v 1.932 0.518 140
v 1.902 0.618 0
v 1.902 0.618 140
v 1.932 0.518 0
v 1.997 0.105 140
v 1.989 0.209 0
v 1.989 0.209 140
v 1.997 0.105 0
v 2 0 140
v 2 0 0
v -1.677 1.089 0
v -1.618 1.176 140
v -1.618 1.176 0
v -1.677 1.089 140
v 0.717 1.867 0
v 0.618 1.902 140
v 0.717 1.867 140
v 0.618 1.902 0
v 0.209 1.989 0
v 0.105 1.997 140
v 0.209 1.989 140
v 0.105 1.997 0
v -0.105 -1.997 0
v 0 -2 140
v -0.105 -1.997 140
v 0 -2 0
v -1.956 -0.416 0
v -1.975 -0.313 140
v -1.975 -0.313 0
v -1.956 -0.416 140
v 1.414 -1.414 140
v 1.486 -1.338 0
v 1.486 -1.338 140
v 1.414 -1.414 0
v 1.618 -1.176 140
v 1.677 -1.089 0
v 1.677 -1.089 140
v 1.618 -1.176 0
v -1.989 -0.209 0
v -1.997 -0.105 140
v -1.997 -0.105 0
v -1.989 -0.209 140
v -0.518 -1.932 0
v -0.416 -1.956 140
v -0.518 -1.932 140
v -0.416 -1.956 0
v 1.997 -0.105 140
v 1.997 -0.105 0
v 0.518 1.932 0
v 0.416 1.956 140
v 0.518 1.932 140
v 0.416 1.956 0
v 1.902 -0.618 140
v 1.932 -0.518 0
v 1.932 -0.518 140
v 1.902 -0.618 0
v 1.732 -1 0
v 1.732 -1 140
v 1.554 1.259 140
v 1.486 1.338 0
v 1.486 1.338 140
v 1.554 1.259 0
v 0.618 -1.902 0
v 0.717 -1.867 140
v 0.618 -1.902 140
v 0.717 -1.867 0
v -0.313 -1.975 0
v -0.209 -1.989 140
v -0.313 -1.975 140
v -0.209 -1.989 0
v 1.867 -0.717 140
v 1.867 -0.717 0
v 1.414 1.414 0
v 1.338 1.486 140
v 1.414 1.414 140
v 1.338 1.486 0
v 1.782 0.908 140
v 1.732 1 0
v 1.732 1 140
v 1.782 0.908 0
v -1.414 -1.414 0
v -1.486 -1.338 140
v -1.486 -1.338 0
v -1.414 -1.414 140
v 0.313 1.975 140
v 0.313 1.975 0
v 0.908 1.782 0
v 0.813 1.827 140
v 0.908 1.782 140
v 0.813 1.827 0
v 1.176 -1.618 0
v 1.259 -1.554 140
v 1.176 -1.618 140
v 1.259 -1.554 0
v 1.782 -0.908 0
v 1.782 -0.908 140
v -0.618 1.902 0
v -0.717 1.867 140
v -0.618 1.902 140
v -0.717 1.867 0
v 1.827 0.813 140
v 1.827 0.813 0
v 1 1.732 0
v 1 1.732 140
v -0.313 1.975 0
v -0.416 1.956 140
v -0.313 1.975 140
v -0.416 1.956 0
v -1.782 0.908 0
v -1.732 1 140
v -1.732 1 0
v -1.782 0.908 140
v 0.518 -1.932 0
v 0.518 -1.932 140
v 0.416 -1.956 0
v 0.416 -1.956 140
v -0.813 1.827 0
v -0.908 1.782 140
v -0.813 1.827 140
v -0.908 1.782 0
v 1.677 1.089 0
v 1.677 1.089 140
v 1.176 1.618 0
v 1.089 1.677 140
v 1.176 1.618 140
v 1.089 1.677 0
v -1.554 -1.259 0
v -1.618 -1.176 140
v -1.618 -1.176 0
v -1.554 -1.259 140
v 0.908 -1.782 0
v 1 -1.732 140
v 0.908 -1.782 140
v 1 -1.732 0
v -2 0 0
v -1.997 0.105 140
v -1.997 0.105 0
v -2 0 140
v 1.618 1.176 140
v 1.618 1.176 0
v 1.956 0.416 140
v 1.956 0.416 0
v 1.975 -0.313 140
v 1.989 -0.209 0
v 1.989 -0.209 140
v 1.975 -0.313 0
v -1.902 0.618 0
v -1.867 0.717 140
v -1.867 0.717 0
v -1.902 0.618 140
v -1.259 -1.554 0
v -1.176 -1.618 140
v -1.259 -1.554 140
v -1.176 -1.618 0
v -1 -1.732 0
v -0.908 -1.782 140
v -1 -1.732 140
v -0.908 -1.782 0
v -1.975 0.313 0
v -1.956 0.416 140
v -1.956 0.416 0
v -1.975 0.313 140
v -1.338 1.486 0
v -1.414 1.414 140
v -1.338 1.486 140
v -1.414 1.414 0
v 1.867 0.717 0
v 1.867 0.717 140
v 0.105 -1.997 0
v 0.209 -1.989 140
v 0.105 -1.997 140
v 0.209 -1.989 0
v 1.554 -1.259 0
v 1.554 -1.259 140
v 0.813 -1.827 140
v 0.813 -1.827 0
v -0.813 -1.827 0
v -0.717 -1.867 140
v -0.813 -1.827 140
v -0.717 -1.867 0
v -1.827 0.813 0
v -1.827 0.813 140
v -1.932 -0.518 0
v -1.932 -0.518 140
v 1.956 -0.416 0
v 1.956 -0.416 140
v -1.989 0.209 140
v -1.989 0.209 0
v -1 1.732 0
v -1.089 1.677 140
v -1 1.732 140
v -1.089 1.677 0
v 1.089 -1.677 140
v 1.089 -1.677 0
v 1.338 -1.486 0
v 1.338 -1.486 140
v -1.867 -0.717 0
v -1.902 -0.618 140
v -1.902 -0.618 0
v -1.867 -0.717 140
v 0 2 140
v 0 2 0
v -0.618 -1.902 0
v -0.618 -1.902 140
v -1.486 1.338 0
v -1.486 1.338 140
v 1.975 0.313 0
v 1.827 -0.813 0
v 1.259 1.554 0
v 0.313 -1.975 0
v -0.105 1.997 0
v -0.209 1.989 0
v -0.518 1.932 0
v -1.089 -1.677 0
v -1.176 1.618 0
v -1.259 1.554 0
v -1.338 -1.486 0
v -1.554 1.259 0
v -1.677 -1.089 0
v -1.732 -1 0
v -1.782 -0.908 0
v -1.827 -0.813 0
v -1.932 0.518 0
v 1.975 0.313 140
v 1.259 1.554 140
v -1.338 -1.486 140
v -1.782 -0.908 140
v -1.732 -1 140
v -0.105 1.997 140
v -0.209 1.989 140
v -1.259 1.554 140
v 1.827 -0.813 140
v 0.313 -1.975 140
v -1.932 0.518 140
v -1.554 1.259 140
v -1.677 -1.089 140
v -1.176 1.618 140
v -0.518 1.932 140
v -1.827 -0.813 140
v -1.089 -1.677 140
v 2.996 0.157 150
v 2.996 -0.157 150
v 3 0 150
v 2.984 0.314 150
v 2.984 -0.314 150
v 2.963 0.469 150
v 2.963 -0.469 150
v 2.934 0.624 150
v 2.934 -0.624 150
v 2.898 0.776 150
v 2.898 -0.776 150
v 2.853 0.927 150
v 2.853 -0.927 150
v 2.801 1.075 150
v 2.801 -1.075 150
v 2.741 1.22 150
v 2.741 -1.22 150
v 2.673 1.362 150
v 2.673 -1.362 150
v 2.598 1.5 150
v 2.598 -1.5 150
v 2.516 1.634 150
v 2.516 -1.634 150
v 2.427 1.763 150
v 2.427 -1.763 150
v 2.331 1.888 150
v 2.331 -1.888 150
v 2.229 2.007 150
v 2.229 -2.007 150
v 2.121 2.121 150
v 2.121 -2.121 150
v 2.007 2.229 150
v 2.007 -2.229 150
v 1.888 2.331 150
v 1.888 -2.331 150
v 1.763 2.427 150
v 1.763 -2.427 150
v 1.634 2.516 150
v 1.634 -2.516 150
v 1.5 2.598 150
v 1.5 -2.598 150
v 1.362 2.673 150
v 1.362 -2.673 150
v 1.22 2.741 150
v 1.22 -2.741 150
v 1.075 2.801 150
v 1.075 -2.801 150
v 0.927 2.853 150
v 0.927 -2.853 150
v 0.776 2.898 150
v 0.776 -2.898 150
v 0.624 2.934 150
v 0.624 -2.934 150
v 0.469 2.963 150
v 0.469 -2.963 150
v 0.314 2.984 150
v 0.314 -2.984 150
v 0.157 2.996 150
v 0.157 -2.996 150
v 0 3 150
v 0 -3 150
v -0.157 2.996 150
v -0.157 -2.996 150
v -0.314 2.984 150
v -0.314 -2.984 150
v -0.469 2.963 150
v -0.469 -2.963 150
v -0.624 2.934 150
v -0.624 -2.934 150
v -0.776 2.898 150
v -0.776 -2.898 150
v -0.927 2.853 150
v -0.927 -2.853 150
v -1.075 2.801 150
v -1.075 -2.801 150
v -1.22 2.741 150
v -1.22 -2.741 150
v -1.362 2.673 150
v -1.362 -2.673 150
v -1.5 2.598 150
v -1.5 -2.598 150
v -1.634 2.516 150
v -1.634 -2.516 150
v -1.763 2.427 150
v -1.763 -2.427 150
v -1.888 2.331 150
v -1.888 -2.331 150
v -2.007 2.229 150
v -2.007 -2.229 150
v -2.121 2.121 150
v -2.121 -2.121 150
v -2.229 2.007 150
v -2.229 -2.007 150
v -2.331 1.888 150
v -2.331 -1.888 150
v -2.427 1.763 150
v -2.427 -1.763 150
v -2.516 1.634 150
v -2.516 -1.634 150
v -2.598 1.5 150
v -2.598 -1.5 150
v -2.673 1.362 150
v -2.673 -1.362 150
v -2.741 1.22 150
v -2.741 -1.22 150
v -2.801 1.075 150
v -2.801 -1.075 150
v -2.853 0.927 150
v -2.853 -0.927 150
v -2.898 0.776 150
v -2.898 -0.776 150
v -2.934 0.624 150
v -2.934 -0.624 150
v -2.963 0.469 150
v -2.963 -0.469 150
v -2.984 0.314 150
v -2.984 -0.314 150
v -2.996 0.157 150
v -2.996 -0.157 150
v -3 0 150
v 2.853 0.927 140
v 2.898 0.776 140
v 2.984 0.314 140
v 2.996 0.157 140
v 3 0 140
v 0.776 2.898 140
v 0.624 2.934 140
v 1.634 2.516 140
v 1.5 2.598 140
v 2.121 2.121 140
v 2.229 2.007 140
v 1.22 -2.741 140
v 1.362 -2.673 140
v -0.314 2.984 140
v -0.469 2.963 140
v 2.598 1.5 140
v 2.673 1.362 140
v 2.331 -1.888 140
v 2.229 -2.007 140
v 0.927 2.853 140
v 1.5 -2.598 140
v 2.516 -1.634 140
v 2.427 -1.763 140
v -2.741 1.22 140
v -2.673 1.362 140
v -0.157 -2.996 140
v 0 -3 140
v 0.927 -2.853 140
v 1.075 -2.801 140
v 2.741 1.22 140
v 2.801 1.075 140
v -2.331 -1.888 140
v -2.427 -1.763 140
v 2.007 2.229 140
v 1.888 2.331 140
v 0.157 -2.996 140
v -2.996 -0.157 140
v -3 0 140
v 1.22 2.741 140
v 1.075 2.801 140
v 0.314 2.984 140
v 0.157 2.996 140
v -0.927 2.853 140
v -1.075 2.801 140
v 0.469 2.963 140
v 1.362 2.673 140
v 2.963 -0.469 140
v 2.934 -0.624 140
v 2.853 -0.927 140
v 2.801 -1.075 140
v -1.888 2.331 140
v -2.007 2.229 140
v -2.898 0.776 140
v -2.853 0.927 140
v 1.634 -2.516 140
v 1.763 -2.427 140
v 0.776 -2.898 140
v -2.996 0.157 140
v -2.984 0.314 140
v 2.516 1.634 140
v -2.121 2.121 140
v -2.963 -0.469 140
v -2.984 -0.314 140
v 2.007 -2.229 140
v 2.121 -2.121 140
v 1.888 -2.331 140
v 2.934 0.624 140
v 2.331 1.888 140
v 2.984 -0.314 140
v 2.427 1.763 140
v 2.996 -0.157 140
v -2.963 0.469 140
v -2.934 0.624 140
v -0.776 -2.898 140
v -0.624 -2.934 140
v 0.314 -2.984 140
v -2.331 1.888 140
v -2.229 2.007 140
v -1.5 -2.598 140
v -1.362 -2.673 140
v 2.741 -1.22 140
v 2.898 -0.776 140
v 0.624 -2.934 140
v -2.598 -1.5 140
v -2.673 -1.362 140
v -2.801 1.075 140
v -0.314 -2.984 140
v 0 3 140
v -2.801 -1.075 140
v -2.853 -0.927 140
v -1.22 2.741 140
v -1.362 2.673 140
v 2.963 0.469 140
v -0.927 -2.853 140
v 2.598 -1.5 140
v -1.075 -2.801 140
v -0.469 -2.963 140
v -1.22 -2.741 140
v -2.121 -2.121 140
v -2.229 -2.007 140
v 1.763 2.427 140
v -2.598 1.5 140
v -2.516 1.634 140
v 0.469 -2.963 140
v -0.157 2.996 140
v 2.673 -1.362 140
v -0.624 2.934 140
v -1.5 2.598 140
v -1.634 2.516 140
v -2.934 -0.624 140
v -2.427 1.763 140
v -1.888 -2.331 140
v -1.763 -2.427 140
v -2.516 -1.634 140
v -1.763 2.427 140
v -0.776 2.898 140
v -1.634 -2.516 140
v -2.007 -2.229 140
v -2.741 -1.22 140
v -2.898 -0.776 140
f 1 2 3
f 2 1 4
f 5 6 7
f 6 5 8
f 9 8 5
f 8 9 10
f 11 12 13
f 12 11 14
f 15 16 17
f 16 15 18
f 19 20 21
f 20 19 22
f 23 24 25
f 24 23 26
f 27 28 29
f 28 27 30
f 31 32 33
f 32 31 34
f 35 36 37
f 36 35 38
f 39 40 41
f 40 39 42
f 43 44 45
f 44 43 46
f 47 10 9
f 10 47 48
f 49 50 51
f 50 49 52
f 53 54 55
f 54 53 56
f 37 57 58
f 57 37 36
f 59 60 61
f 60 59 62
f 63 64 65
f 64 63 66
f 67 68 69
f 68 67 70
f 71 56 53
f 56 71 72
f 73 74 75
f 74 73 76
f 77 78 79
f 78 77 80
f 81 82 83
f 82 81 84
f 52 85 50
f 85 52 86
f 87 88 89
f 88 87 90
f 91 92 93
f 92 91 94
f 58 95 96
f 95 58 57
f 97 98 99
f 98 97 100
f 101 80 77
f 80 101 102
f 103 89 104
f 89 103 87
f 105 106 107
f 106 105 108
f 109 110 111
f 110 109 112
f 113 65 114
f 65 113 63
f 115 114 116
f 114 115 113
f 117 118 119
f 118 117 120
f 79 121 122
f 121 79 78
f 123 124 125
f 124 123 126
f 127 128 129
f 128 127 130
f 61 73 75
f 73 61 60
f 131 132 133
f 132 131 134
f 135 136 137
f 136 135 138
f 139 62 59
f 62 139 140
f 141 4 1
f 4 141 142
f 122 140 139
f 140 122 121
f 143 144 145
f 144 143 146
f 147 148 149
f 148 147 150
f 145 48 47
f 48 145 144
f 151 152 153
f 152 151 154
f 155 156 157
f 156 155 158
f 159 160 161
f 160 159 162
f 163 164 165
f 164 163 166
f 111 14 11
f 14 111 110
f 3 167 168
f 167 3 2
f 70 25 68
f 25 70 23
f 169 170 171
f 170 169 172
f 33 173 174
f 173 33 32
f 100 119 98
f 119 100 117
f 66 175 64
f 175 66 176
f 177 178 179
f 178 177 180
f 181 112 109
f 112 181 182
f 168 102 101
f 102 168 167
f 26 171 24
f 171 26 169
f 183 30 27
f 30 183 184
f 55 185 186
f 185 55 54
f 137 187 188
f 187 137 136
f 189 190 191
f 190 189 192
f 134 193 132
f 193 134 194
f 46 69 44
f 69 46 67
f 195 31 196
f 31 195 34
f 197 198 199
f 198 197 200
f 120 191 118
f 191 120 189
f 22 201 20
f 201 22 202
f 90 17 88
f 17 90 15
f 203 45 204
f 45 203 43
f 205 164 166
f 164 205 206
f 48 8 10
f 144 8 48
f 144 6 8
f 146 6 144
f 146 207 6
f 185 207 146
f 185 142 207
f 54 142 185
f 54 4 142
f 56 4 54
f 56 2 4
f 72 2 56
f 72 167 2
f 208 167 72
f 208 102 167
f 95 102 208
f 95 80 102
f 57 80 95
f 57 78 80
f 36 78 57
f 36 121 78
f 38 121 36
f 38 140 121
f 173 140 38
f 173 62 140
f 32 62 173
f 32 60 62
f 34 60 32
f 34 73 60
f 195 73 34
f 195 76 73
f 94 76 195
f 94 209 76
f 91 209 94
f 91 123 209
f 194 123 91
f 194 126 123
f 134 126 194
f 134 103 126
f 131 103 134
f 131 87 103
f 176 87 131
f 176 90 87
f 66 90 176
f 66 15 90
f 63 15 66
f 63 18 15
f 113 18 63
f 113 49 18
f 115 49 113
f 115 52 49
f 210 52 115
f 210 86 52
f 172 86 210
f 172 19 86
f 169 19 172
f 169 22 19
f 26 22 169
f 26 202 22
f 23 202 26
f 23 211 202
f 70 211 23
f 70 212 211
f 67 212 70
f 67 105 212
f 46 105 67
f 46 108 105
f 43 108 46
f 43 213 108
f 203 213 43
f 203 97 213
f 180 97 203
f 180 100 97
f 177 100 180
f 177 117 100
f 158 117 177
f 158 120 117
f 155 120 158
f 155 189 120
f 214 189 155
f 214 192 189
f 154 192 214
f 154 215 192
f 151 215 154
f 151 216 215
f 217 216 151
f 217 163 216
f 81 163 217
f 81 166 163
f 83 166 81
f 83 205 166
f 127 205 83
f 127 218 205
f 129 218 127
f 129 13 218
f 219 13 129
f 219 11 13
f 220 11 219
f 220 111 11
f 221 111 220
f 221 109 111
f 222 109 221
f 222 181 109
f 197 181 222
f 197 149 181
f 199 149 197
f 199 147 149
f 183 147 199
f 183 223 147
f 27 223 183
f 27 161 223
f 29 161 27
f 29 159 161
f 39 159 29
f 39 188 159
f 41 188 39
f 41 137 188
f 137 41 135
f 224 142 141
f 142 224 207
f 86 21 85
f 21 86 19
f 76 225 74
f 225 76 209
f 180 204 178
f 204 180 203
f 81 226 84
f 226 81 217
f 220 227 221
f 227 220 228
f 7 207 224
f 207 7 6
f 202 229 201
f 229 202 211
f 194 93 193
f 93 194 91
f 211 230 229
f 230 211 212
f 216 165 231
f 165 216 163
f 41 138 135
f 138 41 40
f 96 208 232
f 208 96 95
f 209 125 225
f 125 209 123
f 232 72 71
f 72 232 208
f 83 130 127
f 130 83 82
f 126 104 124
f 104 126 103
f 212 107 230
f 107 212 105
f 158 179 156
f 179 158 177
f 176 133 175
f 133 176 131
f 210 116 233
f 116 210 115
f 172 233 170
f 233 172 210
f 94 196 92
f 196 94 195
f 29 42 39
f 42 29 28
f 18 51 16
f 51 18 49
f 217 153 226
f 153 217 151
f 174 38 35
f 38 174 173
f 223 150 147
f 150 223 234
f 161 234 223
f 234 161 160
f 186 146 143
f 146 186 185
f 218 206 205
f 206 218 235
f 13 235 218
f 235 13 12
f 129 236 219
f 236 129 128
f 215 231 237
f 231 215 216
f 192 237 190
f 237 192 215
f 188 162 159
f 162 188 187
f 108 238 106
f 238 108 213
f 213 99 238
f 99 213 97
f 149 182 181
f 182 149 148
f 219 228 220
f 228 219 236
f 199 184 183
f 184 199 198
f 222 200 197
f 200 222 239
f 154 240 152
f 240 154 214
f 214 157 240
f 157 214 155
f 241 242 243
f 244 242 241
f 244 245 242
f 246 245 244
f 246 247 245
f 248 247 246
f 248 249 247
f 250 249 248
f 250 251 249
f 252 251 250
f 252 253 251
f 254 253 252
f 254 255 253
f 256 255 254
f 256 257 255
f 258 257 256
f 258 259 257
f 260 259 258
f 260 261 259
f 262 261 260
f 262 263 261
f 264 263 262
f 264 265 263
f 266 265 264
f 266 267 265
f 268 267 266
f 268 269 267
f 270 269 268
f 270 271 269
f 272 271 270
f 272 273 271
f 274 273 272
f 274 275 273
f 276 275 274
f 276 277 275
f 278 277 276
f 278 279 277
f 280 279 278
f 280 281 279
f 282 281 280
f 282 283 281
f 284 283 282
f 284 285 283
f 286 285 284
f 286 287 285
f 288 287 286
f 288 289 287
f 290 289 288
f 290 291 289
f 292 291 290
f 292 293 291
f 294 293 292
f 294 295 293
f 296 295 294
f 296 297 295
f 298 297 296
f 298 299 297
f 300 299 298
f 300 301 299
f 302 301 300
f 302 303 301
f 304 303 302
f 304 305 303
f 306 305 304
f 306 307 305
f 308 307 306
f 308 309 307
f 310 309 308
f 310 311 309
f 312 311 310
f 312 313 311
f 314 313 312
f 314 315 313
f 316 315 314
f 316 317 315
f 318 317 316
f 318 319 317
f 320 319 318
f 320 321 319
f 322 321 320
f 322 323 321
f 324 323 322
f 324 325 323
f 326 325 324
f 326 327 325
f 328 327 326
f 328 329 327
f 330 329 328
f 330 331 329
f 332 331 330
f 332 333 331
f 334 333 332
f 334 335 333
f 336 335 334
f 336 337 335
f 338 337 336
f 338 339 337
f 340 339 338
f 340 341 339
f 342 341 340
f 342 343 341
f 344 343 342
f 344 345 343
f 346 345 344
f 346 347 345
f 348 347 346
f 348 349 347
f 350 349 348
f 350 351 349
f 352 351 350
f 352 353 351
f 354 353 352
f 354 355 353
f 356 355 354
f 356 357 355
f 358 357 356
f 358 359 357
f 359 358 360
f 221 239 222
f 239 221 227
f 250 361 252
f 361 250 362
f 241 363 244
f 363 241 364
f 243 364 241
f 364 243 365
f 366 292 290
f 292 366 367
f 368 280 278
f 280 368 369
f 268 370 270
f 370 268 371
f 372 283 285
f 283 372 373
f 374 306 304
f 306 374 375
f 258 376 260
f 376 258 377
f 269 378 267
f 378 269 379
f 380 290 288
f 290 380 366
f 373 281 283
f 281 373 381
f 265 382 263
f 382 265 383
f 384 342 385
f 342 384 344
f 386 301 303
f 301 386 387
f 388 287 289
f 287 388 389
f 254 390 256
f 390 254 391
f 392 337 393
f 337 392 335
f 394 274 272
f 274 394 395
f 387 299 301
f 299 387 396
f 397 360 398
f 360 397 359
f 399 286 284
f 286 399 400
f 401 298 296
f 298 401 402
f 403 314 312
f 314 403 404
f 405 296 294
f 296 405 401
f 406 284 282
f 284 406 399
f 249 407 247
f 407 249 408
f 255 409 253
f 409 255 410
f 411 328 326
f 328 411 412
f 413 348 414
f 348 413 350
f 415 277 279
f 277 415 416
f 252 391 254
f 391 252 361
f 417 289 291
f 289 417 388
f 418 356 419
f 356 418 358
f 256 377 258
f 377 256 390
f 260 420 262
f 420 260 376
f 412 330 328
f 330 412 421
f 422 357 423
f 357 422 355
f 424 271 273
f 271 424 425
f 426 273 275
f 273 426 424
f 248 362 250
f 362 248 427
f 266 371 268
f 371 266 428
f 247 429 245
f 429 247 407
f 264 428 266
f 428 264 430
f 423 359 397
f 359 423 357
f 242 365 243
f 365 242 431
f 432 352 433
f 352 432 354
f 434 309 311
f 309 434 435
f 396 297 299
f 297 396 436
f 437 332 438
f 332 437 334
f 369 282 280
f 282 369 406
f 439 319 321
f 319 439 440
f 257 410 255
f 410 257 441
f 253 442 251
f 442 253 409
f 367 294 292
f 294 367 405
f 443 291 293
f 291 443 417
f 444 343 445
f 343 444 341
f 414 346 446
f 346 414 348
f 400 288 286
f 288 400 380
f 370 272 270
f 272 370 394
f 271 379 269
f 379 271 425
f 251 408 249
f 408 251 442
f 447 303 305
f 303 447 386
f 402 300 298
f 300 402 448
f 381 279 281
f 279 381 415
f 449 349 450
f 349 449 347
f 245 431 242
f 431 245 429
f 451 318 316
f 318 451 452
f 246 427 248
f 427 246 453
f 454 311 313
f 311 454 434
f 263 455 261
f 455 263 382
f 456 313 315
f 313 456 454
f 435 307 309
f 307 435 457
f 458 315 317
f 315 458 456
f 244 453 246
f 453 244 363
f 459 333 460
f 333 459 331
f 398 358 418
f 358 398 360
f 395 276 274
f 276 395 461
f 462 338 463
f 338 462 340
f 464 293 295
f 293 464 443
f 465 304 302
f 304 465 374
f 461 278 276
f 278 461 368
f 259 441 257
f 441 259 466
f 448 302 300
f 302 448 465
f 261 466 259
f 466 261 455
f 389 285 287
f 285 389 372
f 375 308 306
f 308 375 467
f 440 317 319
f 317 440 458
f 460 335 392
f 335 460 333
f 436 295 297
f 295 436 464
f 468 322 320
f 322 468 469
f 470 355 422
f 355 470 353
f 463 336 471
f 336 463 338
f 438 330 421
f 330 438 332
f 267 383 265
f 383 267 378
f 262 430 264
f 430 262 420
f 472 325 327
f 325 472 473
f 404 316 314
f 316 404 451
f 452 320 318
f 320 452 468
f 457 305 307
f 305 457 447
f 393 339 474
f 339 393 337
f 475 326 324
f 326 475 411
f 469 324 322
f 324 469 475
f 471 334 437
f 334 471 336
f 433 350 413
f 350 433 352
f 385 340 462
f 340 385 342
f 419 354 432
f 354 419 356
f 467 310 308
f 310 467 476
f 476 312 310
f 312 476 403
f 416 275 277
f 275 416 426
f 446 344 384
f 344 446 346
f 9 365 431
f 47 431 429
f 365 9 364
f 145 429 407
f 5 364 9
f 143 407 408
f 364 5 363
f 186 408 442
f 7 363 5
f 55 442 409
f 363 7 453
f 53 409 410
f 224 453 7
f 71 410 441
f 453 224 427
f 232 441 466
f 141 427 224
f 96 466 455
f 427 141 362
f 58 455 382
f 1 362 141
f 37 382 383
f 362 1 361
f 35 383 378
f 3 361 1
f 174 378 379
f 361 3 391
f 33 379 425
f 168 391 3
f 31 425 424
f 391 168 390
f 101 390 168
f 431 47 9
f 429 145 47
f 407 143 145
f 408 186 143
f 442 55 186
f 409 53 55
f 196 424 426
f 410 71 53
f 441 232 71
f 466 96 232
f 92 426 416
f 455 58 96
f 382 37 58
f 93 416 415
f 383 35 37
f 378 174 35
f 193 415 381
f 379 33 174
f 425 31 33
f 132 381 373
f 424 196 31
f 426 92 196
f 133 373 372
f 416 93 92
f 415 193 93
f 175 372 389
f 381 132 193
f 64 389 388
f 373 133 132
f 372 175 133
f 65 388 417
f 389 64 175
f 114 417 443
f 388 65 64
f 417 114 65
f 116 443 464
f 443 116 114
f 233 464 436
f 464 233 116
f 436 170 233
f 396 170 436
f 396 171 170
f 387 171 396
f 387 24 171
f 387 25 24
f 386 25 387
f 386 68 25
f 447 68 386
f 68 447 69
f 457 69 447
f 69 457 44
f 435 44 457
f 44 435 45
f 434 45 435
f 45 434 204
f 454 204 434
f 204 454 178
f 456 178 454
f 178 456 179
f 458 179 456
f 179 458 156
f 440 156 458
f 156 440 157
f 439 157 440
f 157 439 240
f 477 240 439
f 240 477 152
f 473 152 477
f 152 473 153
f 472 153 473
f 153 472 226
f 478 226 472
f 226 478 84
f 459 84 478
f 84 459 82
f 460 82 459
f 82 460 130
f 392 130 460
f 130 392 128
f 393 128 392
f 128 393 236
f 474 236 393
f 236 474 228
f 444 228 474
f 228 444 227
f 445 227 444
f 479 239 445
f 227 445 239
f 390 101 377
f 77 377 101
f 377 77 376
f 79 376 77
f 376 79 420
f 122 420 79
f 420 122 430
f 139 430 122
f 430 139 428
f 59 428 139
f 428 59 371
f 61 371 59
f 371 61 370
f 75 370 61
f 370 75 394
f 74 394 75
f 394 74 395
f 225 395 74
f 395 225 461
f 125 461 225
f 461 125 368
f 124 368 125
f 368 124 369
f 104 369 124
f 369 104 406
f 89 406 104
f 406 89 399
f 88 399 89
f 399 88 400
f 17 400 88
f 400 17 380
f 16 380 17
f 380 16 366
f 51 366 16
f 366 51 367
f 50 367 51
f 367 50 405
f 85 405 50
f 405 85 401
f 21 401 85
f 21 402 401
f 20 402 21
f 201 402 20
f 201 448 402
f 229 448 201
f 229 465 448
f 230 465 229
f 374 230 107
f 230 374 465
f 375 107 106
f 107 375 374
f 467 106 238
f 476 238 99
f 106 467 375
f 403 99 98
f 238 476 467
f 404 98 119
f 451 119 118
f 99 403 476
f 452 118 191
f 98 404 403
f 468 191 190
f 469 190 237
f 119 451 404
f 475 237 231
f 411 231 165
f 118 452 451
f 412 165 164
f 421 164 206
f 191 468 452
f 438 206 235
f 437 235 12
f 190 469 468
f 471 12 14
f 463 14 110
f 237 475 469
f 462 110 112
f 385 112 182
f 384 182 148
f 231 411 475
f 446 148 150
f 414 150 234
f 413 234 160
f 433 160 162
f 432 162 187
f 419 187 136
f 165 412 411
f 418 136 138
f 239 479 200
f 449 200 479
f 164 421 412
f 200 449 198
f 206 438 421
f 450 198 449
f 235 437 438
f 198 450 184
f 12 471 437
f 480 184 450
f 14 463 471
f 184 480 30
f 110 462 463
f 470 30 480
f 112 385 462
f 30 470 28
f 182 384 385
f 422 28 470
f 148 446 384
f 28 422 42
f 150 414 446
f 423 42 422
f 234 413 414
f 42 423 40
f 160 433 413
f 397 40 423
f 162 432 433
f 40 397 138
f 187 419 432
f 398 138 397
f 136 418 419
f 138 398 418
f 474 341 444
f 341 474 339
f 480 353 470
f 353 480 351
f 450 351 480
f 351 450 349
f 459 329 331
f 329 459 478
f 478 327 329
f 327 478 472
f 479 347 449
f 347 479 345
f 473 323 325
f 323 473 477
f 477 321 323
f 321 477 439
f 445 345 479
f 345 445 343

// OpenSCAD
// file: Bird_Config.scad
/////////////////////////////////////////////////////////
// 7" Spinning Trolling Bird
// Global Parameters
// Units = mm
/////////////////////////////////////////////////////////

$fn = 120;

//----------------------------
// Overall Dimensions
//----------------------------

overall_length = 177.8;
body_length    = 114.3;
nose_length    = 63.5;

max_diameter   = 50.8;
tail_diameter  = 8.0;
nose_tip       = 8.0;

//----------------------------
// Wall Thickness
//----------------------------

wall = 2.8;

//----------------------------
// Shaft
//----------------------------

shaft_diameter = 4.0;
bearing_diameter = 6.0;

shaft_length = 150;

shaft_clearance = 0.20;

//----------------------------
// Hardware
//----------------------------

screw = 3.0;

insert_OD = 5.0;
insert_length = 4.0;

insert_depth = 5.2;

num_screws = 6;

//----------------------------
// Tow Eye
//----------------------------

eye_OD = 10;
eye_ID = 5;
eye_length = 8;

//----------------------------
// Ballast Cavity
//----------------------------

ballast_diameter = 18;
ballast_length = 60;

//----------------------------
// Rotor
//----------------------------

blade_count = 2;

blade_span = 62;

blade_width = 18;

blade_thickness = 3.2;

blade_pitch = 28;

//----------------------------
// Nose Bearing
//----------------------------

bearing_OD = 12;

bearing_ID = 6.1;

bearing_depth = 10;

//----------------------------
// Alignment Pins
//----------------------------

pin_diameter = 3.0;

pin_length = 8;

//----------------------------
// Split Plane
//----------------------------

split = 0;

//----------------------------
// Clearances
//----------------------------

fit = 0.20;
// file: Bird_Shaft.scad
include <Bird_Config.scad>;

//////////////////////////////////////////////////////
// 7" Trolling Bird
// Shaft Assembly
//////////////////////////////////////////////////////

module shaft(){

    // Main shaft cylinder

    cylinder(
        d=shaft_diameter,
        h=shaft_length,
        center=false);

}

module shaft_with_bearing_seat(){

    union(){

        // Main shaft
        shaft();

        // Bearing seat at front
        translate([0, 0, shaft_length-bearing_depth])

        cylinder(
            d=bearing_diameter,
            h=bearing_depth,
            center=false);

    }

}

//////////////////////////////////////////////////////
// EXPORT SHAFT
//////////////////////////////////////////////////////

// shaft_with_bearing_seat();
// main file
include <Bird_Shaft.scad>;

//////////////////////////////////////////////////////
// Export: Shaft Assembly (for 3D printing)
//////////////////////////////////////////////////////

shaft_with_bearing_seat();
